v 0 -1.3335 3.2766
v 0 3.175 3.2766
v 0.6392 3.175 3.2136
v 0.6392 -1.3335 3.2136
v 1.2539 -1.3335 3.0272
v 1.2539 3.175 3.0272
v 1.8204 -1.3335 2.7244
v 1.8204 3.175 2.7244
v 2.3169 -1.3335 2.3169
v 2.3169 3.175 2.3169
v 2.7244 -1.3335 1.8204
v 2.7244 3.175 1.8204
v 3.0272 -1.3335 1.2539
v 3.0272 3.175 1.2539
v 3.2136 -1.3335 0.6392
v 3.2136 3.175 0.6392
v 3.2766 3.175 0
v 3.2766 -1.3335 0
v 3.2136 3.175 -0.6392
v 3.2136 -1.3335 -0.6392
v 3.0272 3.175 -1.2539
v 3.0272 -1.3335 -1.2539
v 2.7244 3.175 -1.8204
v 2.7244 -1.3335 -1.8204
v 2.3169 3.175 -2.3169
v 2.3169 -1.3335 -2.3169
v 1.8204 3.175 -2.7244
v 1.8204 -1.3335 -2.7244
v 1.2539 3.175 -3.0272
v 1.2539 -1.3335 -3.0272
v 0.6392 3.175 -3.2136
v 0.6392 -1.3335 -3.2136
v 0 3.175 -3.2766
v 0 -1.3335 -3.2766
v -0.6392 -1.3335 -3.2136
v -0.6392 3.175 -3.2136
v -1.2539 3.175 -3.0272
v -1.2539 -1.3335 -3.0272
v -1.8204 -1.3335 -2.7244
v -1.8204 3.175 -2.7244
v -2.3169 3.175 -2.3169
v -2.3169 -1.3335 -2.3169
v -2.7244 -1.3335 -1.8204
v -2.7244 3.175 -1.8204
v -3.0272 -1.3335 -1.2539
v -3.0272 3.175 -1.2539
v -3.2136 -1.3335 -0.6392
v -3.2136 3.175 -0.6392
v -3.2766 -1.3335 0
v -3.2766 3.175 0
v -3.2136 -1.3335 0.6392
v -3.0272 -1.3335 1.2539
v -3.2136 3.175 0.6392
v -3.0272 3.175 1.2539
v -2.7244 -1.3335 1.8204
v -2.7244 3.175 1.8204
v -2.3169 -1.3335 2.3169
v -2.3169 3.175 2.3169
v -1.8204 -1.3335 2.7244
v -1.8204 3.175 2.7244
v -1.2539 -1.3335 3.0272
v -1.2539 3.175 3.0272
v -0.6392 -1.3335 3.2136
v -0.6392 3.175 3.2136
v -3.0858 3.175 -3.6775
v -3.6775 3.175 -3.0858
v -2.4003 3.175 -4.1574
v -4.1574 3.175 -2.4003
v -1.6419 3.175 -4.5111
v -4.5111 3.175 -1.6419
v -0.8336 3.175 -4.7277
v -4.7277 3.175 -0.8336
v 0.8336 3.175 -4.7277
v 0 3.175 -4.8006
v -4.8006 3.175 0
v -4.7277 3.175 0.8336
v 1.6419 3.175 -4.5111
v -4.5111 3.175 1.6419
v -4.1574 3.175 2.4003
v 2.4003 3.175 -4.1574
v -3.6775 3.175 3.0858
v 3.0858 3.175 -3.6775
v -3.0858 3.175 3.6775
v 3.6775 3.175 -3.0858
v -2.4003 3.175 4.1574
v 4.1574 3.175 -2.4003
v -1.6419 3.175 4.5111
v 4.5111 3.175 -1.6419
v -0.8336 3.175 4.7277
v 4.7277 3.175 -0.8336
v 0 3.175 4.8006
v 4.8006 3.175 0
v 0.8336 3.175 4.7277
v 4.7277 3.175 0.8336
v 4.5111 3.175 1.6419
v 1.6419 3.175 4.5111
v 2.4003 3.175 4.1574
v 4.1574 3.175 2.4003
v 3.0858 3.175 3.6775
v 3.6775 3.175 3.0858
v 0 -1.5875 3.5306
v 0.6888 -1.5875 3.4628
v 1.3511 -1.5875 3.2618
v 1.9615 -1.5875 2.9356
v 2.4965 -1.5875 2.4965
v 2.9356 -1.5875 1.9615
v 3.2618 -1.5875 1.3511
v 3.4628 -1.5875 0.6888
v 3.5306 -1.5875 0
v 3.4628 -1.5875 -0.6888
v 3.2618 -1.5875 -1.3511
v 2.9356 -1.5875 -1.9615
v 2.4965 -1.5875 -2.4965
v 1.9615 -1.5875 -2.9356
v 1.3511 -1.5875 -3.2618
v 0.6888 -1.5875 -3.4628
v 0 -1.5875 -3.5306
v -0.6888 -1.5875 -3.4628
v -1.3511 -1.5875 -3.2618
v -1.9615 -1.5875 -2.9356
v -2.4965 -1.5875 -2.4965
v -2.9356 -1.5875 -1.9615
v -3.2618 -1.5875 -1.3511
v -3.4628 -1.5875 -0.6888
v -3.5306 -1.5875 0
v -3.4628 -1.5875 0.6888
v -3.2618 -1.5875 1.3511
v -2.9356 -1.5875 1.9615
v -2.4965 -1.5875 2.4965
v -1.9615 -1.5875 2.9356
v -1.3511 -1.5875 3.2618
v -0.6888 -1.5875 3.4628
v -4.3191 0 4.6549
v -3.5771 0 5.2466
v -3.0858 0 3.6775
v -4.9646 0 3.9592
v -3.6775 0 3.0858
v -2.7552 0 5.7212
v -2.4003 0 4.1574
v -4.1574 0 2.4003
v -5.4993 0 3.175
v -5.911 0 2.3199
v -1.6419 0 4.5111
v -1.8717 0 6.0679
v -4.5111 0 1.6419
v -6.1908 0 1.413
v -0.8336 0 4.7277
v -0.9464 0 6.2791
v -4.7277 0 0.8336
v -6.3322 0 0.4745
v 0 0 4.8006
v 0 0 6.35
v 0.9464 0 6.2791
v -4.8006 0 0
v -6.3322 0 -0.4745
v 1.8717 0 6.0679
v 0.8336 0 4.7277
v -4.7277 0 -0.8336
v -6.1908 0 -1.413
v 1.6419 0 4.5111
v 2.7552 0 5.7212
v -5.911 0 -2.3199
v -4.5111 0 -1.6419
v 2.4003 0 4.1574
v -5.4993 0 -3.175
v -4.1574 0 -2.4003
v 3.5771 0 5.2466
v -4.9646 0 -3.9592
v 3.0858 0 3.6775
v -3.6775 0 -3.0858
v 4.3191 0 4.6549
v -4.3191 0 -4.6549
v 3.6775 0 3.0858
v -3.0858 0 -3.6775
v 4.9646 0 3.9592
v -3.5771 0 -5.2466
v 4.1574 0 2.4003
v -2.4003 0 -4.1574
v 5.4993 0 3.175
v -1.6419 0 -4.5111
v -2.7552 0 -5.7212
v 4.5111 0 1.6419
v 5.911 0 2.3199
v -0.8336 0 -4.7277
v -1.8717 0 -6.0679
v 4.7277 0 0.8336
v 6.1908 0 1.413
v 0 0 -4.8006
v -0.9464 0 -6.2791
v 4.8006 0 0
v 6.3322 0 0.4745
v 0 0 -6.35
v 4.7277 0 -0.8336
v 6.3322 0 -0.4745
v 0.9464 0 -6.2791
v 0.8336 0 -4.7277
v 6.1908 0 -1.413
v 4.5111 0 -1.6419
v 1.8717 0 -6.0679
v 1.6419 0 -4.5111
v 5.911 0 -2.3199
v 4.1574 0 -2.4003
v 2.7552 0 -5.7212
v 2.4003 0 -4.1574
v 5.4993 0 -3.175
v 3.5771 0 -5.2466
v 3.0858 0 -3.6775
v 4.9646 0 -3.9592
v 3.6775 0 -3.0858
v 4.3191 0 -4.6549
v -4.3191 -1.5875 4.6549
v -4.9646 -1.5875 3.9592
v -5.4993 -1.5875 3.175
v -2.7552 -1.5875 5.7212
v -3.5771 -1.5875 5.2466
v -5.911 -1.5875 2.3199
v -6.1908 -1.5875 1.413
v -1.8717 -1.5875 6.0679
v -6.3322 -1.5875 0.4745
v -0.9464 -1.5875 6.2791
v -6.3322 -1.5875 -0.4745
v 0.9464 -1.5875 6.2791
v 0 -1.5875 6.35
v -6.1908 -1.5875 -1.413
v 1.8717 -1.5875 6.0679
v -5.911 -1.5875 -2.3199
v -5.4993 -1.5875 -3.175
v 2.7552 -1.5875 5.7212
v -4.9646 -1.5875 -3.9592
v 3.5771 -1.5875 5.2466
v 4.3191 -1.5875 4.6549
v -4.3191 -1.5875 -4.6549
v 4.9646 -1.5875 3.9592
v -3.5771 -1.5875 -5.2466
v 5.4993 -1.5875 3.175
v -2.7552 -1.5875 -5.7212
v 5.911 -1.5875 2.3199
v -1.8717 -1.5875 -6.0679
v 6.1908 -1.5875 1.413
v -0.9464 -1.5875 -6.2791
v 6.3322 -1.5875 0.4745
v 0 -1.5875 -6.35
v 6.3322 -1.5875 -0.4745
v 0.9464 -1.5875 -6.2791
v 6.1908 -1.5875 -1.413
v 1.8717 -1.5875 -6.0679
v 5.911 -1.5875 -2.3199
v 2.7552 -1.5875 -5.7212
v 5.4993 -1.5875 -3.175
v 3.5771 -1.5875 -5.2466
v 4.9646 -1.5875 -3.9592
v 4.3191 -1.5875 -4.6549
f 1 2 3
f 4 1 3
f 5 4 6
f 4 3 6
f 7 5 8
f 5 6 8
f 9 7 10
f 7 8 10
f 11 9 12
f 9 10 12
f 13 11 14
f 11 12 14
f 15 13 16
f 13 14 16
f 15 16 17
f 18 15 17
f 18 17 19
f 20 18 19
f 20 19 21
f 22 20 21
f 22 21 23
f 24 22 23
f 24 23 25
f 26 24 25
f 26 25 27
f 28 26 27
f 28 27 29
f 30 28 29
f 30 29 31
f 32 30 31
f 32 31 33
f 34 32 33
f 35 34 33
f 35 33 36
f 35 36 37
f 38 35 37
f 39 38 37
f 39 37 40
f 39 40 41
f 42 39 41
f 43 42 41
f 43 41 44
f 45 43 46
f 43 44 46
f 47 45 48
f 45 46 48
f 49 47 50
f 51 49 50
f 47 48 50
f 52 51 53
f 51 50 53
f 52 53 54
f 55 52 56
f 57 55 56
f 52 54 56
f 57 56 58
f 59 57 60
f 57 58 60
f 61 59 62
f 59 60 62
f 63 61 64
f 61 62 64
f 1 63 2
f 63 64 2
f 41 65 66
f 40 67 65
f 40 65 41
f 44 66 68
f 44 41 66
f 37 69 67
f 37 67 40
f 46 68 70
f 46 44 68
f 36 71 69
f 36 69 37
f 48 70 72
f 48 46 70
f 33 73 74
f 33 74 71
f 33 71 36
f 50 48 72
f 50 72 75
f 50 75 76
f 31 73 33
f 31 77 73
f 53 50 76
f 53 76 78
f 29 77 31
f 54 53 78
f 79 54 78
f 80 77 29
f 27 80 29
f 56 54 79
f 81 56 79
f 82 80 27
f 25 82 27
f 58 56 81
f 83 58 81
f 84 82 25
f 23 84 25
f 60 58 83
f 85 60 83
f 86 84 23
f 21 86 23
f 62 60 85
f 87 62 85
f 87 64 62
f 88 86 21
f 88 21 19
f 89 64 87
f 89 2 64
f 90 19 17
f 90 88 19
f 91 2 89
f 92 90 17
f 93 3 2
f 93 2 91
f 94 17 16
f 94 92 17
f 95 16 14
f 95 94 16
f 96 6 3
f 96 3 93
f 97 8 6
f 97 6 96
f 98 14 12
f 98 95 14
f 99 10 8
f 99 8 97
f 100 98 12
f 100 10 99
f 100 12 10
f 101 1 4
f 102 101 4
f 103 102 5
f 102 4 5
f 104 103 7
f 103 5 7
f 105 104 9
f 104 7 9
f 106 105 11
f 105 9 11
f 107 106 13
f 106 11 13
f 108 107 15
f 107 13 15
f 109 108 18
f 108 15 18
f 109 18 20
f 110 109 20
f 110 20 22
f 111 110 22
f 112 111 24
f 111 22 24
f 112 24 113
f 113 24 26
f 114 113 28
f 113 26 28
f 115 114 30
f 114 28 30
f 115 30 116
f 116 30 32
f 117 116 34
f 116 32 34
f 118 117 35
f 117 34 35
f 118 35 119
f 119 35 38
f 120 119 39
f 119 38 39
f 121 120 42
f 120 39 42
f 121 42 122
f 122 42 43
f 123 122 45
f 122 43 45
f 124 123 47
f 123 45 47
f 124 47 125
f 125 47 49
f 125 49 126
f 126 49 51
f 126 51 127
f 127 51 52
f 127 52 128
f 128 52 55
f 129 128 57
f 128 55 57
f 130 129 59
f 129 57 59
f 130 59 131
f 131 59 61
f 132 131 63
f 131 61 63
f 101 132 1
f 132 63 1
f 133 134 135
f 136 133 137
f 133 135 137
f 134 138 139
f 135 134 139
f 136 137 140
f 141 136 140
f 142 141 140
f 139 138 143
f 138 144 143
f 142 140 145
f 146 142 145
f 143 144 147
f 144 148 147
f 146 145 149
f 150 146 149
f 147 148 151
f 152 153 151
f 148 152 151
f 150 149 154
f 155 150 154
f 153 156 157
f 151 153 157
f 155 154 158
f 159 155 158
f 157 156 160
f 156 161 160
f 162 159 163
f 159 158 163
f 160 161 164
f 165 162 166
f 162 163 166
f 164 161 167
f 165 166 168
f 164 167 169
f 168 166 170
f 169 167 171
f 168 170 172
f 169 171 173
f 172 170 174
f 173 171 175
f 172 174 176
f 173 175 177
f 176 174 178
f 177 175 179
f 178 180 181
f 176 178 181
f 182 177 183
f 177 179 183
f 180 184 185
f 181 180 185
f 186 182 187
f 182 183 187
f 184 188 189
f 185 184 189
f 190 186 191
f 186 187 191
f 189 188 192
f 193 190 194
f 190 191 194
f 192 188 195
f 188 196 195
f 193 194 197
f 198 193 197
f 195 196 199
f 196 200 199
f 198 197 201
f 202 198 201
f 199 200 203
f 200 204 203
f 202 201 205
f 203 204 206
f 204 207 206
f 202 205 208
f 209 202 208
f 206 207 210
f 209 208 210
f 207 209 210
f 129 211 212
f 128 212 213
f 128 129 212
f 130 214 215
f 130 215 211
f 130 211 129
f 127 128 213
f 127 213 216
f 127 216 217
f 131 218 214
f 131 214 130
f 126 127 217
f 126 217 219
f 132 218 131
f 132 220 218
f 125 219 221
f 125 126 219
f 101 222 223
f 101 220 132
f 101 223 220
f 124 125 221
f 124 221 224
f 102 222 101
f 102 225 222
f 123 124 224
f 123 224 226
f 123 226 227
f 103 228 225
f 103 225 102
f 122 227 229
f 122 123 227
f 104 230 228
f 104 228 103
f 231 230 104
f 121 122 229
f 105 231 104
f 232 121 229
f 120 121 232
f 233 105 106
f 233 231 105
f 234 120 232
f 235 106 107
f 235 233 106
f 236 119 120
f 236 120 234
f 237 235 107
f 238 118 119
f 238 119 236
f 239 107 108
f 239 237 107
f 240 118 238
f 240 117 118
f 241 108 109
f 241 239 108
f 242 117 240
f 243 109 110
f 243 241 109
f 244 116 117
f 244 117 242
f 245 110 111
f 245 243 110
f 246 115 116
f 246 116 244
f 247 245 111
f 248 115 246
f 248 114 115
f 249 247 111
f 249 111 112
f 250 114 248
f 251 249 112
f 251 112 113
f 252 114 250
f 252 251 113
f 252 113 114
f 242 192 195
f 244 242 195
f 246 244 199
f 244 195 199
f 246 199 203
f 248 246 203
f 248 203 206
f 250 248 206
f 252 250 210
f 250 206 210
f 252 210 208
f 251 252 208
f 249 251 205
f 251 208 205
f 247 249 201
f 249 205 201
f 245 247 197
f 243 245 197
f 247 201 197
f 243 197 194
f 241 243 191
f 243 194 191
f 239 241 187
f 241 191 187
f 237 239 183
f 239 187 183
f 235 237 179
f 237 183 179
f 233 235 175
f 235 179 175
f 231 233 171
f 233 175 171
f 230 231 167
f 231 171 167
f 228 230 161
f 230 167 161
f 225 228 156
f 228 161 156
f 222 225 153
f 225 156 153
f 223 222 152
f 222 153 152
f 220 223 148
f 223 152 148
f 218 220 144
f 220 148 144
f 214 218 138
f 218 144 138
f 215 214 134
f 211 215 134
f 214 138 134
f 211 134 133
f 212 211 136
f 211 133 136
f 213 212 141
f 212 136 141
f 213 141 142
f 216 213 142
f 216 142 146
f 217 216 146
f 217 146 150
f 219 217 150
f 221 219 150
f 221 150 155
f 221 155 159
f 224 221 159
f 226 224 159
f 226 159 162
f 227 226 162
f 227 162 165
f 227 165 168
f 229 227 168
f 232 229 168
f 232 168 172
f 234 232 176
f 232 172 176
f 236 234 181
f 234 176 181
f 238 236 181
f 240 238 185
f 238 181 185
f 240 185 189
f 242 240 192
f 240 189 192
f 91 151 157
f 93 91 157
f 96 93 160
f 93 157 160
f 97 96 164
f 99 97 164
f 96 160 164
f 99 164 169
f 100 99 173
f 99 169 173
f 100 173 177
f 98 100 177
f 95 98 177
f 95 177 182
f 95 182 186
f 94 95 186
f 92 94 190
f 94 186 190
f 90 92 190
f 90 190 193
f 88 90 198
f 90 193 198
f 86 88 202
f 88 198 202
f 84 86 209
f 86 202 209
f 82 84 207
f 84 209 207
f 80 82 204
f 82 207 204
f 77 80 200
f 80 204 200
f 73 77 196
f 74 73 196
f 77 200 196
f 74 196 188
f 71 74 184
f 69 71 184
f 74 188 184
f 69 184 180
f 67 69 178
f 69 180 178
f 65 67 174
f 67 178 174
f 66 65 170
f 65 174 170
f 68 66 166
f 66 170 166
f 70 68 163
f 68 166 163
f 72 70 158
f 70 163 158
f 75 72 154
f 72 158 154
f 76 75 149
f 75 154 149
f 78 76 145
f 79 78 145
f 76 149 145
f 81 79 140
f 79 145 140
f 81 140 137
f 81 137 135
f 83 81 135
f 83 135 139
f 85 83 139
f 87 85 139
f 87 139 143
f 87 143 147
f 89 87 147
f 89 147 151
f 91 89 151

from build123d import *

# Parameters (mm, degrees)
SKETCH2_R           = 4.8006
BOSS_EXTRUDE1_DEPTH = 3.175
SKETCH3_R           = 6.35
BOSS_EXTRUDE2_DEPTH = 1.5875
SKETCH4_R           = 3.2766
CUT_EXTRUDE1_DEPTH  = 11.164959727
CHAMFER1_SIZE       = 0.254


with BuildPart() as part:
    # Sketch2 → Boss-Extrude1 (new body)
    with BuildSketch(Plane(origin=(0, 0, 0), x_dir=(1, 0, 0), z_dir=(0, 1, 0))):
        with Locations(Location((0, 0, 0), (0, 0, 270))):
            Circle(SKETCH2_R)
    extrude(amount=BOSS_EXTRUDE1_DEPTH)

    # Sketch3 → Boss-Extrude2 (add)
    with BuildSketch(Plane(origin=(0, 0, 0), x_dir=(-1, 0, 0), z_dir=(0, -1, 0))):
        with Locations(Location((0, 0, 0), (0, 0, 90))):
            Circle(SKETCH3_R)
    extrude(amount=BOSS_EXTRUDE2_DEPTH)

    # Sketch4 → Cut-Extrude1 (cut, through all)
    with BuildSketch(Plane(origin=(0, 3.175, 0), x_dir=(1, 0, 0), z_dir=(0, 1, 0))):
        with Locations(Location((0, 0, 0), (0, 0, 270))):
            Circle(SKETCH4_R)
    extrude(amount=-CUT_EXTRUDE1_DEPTH, mode=Mode.SUBTRACT)

    # Chamfer1
    chamfer1_edges = [part.edges().sort_by_distance(p)[0] for p in [
        (0, -1.5875, -3.2766),
    ]]
    chamfer(chamfer1_edges, length=CHAMFER1_SIZE)


solid = part.part
